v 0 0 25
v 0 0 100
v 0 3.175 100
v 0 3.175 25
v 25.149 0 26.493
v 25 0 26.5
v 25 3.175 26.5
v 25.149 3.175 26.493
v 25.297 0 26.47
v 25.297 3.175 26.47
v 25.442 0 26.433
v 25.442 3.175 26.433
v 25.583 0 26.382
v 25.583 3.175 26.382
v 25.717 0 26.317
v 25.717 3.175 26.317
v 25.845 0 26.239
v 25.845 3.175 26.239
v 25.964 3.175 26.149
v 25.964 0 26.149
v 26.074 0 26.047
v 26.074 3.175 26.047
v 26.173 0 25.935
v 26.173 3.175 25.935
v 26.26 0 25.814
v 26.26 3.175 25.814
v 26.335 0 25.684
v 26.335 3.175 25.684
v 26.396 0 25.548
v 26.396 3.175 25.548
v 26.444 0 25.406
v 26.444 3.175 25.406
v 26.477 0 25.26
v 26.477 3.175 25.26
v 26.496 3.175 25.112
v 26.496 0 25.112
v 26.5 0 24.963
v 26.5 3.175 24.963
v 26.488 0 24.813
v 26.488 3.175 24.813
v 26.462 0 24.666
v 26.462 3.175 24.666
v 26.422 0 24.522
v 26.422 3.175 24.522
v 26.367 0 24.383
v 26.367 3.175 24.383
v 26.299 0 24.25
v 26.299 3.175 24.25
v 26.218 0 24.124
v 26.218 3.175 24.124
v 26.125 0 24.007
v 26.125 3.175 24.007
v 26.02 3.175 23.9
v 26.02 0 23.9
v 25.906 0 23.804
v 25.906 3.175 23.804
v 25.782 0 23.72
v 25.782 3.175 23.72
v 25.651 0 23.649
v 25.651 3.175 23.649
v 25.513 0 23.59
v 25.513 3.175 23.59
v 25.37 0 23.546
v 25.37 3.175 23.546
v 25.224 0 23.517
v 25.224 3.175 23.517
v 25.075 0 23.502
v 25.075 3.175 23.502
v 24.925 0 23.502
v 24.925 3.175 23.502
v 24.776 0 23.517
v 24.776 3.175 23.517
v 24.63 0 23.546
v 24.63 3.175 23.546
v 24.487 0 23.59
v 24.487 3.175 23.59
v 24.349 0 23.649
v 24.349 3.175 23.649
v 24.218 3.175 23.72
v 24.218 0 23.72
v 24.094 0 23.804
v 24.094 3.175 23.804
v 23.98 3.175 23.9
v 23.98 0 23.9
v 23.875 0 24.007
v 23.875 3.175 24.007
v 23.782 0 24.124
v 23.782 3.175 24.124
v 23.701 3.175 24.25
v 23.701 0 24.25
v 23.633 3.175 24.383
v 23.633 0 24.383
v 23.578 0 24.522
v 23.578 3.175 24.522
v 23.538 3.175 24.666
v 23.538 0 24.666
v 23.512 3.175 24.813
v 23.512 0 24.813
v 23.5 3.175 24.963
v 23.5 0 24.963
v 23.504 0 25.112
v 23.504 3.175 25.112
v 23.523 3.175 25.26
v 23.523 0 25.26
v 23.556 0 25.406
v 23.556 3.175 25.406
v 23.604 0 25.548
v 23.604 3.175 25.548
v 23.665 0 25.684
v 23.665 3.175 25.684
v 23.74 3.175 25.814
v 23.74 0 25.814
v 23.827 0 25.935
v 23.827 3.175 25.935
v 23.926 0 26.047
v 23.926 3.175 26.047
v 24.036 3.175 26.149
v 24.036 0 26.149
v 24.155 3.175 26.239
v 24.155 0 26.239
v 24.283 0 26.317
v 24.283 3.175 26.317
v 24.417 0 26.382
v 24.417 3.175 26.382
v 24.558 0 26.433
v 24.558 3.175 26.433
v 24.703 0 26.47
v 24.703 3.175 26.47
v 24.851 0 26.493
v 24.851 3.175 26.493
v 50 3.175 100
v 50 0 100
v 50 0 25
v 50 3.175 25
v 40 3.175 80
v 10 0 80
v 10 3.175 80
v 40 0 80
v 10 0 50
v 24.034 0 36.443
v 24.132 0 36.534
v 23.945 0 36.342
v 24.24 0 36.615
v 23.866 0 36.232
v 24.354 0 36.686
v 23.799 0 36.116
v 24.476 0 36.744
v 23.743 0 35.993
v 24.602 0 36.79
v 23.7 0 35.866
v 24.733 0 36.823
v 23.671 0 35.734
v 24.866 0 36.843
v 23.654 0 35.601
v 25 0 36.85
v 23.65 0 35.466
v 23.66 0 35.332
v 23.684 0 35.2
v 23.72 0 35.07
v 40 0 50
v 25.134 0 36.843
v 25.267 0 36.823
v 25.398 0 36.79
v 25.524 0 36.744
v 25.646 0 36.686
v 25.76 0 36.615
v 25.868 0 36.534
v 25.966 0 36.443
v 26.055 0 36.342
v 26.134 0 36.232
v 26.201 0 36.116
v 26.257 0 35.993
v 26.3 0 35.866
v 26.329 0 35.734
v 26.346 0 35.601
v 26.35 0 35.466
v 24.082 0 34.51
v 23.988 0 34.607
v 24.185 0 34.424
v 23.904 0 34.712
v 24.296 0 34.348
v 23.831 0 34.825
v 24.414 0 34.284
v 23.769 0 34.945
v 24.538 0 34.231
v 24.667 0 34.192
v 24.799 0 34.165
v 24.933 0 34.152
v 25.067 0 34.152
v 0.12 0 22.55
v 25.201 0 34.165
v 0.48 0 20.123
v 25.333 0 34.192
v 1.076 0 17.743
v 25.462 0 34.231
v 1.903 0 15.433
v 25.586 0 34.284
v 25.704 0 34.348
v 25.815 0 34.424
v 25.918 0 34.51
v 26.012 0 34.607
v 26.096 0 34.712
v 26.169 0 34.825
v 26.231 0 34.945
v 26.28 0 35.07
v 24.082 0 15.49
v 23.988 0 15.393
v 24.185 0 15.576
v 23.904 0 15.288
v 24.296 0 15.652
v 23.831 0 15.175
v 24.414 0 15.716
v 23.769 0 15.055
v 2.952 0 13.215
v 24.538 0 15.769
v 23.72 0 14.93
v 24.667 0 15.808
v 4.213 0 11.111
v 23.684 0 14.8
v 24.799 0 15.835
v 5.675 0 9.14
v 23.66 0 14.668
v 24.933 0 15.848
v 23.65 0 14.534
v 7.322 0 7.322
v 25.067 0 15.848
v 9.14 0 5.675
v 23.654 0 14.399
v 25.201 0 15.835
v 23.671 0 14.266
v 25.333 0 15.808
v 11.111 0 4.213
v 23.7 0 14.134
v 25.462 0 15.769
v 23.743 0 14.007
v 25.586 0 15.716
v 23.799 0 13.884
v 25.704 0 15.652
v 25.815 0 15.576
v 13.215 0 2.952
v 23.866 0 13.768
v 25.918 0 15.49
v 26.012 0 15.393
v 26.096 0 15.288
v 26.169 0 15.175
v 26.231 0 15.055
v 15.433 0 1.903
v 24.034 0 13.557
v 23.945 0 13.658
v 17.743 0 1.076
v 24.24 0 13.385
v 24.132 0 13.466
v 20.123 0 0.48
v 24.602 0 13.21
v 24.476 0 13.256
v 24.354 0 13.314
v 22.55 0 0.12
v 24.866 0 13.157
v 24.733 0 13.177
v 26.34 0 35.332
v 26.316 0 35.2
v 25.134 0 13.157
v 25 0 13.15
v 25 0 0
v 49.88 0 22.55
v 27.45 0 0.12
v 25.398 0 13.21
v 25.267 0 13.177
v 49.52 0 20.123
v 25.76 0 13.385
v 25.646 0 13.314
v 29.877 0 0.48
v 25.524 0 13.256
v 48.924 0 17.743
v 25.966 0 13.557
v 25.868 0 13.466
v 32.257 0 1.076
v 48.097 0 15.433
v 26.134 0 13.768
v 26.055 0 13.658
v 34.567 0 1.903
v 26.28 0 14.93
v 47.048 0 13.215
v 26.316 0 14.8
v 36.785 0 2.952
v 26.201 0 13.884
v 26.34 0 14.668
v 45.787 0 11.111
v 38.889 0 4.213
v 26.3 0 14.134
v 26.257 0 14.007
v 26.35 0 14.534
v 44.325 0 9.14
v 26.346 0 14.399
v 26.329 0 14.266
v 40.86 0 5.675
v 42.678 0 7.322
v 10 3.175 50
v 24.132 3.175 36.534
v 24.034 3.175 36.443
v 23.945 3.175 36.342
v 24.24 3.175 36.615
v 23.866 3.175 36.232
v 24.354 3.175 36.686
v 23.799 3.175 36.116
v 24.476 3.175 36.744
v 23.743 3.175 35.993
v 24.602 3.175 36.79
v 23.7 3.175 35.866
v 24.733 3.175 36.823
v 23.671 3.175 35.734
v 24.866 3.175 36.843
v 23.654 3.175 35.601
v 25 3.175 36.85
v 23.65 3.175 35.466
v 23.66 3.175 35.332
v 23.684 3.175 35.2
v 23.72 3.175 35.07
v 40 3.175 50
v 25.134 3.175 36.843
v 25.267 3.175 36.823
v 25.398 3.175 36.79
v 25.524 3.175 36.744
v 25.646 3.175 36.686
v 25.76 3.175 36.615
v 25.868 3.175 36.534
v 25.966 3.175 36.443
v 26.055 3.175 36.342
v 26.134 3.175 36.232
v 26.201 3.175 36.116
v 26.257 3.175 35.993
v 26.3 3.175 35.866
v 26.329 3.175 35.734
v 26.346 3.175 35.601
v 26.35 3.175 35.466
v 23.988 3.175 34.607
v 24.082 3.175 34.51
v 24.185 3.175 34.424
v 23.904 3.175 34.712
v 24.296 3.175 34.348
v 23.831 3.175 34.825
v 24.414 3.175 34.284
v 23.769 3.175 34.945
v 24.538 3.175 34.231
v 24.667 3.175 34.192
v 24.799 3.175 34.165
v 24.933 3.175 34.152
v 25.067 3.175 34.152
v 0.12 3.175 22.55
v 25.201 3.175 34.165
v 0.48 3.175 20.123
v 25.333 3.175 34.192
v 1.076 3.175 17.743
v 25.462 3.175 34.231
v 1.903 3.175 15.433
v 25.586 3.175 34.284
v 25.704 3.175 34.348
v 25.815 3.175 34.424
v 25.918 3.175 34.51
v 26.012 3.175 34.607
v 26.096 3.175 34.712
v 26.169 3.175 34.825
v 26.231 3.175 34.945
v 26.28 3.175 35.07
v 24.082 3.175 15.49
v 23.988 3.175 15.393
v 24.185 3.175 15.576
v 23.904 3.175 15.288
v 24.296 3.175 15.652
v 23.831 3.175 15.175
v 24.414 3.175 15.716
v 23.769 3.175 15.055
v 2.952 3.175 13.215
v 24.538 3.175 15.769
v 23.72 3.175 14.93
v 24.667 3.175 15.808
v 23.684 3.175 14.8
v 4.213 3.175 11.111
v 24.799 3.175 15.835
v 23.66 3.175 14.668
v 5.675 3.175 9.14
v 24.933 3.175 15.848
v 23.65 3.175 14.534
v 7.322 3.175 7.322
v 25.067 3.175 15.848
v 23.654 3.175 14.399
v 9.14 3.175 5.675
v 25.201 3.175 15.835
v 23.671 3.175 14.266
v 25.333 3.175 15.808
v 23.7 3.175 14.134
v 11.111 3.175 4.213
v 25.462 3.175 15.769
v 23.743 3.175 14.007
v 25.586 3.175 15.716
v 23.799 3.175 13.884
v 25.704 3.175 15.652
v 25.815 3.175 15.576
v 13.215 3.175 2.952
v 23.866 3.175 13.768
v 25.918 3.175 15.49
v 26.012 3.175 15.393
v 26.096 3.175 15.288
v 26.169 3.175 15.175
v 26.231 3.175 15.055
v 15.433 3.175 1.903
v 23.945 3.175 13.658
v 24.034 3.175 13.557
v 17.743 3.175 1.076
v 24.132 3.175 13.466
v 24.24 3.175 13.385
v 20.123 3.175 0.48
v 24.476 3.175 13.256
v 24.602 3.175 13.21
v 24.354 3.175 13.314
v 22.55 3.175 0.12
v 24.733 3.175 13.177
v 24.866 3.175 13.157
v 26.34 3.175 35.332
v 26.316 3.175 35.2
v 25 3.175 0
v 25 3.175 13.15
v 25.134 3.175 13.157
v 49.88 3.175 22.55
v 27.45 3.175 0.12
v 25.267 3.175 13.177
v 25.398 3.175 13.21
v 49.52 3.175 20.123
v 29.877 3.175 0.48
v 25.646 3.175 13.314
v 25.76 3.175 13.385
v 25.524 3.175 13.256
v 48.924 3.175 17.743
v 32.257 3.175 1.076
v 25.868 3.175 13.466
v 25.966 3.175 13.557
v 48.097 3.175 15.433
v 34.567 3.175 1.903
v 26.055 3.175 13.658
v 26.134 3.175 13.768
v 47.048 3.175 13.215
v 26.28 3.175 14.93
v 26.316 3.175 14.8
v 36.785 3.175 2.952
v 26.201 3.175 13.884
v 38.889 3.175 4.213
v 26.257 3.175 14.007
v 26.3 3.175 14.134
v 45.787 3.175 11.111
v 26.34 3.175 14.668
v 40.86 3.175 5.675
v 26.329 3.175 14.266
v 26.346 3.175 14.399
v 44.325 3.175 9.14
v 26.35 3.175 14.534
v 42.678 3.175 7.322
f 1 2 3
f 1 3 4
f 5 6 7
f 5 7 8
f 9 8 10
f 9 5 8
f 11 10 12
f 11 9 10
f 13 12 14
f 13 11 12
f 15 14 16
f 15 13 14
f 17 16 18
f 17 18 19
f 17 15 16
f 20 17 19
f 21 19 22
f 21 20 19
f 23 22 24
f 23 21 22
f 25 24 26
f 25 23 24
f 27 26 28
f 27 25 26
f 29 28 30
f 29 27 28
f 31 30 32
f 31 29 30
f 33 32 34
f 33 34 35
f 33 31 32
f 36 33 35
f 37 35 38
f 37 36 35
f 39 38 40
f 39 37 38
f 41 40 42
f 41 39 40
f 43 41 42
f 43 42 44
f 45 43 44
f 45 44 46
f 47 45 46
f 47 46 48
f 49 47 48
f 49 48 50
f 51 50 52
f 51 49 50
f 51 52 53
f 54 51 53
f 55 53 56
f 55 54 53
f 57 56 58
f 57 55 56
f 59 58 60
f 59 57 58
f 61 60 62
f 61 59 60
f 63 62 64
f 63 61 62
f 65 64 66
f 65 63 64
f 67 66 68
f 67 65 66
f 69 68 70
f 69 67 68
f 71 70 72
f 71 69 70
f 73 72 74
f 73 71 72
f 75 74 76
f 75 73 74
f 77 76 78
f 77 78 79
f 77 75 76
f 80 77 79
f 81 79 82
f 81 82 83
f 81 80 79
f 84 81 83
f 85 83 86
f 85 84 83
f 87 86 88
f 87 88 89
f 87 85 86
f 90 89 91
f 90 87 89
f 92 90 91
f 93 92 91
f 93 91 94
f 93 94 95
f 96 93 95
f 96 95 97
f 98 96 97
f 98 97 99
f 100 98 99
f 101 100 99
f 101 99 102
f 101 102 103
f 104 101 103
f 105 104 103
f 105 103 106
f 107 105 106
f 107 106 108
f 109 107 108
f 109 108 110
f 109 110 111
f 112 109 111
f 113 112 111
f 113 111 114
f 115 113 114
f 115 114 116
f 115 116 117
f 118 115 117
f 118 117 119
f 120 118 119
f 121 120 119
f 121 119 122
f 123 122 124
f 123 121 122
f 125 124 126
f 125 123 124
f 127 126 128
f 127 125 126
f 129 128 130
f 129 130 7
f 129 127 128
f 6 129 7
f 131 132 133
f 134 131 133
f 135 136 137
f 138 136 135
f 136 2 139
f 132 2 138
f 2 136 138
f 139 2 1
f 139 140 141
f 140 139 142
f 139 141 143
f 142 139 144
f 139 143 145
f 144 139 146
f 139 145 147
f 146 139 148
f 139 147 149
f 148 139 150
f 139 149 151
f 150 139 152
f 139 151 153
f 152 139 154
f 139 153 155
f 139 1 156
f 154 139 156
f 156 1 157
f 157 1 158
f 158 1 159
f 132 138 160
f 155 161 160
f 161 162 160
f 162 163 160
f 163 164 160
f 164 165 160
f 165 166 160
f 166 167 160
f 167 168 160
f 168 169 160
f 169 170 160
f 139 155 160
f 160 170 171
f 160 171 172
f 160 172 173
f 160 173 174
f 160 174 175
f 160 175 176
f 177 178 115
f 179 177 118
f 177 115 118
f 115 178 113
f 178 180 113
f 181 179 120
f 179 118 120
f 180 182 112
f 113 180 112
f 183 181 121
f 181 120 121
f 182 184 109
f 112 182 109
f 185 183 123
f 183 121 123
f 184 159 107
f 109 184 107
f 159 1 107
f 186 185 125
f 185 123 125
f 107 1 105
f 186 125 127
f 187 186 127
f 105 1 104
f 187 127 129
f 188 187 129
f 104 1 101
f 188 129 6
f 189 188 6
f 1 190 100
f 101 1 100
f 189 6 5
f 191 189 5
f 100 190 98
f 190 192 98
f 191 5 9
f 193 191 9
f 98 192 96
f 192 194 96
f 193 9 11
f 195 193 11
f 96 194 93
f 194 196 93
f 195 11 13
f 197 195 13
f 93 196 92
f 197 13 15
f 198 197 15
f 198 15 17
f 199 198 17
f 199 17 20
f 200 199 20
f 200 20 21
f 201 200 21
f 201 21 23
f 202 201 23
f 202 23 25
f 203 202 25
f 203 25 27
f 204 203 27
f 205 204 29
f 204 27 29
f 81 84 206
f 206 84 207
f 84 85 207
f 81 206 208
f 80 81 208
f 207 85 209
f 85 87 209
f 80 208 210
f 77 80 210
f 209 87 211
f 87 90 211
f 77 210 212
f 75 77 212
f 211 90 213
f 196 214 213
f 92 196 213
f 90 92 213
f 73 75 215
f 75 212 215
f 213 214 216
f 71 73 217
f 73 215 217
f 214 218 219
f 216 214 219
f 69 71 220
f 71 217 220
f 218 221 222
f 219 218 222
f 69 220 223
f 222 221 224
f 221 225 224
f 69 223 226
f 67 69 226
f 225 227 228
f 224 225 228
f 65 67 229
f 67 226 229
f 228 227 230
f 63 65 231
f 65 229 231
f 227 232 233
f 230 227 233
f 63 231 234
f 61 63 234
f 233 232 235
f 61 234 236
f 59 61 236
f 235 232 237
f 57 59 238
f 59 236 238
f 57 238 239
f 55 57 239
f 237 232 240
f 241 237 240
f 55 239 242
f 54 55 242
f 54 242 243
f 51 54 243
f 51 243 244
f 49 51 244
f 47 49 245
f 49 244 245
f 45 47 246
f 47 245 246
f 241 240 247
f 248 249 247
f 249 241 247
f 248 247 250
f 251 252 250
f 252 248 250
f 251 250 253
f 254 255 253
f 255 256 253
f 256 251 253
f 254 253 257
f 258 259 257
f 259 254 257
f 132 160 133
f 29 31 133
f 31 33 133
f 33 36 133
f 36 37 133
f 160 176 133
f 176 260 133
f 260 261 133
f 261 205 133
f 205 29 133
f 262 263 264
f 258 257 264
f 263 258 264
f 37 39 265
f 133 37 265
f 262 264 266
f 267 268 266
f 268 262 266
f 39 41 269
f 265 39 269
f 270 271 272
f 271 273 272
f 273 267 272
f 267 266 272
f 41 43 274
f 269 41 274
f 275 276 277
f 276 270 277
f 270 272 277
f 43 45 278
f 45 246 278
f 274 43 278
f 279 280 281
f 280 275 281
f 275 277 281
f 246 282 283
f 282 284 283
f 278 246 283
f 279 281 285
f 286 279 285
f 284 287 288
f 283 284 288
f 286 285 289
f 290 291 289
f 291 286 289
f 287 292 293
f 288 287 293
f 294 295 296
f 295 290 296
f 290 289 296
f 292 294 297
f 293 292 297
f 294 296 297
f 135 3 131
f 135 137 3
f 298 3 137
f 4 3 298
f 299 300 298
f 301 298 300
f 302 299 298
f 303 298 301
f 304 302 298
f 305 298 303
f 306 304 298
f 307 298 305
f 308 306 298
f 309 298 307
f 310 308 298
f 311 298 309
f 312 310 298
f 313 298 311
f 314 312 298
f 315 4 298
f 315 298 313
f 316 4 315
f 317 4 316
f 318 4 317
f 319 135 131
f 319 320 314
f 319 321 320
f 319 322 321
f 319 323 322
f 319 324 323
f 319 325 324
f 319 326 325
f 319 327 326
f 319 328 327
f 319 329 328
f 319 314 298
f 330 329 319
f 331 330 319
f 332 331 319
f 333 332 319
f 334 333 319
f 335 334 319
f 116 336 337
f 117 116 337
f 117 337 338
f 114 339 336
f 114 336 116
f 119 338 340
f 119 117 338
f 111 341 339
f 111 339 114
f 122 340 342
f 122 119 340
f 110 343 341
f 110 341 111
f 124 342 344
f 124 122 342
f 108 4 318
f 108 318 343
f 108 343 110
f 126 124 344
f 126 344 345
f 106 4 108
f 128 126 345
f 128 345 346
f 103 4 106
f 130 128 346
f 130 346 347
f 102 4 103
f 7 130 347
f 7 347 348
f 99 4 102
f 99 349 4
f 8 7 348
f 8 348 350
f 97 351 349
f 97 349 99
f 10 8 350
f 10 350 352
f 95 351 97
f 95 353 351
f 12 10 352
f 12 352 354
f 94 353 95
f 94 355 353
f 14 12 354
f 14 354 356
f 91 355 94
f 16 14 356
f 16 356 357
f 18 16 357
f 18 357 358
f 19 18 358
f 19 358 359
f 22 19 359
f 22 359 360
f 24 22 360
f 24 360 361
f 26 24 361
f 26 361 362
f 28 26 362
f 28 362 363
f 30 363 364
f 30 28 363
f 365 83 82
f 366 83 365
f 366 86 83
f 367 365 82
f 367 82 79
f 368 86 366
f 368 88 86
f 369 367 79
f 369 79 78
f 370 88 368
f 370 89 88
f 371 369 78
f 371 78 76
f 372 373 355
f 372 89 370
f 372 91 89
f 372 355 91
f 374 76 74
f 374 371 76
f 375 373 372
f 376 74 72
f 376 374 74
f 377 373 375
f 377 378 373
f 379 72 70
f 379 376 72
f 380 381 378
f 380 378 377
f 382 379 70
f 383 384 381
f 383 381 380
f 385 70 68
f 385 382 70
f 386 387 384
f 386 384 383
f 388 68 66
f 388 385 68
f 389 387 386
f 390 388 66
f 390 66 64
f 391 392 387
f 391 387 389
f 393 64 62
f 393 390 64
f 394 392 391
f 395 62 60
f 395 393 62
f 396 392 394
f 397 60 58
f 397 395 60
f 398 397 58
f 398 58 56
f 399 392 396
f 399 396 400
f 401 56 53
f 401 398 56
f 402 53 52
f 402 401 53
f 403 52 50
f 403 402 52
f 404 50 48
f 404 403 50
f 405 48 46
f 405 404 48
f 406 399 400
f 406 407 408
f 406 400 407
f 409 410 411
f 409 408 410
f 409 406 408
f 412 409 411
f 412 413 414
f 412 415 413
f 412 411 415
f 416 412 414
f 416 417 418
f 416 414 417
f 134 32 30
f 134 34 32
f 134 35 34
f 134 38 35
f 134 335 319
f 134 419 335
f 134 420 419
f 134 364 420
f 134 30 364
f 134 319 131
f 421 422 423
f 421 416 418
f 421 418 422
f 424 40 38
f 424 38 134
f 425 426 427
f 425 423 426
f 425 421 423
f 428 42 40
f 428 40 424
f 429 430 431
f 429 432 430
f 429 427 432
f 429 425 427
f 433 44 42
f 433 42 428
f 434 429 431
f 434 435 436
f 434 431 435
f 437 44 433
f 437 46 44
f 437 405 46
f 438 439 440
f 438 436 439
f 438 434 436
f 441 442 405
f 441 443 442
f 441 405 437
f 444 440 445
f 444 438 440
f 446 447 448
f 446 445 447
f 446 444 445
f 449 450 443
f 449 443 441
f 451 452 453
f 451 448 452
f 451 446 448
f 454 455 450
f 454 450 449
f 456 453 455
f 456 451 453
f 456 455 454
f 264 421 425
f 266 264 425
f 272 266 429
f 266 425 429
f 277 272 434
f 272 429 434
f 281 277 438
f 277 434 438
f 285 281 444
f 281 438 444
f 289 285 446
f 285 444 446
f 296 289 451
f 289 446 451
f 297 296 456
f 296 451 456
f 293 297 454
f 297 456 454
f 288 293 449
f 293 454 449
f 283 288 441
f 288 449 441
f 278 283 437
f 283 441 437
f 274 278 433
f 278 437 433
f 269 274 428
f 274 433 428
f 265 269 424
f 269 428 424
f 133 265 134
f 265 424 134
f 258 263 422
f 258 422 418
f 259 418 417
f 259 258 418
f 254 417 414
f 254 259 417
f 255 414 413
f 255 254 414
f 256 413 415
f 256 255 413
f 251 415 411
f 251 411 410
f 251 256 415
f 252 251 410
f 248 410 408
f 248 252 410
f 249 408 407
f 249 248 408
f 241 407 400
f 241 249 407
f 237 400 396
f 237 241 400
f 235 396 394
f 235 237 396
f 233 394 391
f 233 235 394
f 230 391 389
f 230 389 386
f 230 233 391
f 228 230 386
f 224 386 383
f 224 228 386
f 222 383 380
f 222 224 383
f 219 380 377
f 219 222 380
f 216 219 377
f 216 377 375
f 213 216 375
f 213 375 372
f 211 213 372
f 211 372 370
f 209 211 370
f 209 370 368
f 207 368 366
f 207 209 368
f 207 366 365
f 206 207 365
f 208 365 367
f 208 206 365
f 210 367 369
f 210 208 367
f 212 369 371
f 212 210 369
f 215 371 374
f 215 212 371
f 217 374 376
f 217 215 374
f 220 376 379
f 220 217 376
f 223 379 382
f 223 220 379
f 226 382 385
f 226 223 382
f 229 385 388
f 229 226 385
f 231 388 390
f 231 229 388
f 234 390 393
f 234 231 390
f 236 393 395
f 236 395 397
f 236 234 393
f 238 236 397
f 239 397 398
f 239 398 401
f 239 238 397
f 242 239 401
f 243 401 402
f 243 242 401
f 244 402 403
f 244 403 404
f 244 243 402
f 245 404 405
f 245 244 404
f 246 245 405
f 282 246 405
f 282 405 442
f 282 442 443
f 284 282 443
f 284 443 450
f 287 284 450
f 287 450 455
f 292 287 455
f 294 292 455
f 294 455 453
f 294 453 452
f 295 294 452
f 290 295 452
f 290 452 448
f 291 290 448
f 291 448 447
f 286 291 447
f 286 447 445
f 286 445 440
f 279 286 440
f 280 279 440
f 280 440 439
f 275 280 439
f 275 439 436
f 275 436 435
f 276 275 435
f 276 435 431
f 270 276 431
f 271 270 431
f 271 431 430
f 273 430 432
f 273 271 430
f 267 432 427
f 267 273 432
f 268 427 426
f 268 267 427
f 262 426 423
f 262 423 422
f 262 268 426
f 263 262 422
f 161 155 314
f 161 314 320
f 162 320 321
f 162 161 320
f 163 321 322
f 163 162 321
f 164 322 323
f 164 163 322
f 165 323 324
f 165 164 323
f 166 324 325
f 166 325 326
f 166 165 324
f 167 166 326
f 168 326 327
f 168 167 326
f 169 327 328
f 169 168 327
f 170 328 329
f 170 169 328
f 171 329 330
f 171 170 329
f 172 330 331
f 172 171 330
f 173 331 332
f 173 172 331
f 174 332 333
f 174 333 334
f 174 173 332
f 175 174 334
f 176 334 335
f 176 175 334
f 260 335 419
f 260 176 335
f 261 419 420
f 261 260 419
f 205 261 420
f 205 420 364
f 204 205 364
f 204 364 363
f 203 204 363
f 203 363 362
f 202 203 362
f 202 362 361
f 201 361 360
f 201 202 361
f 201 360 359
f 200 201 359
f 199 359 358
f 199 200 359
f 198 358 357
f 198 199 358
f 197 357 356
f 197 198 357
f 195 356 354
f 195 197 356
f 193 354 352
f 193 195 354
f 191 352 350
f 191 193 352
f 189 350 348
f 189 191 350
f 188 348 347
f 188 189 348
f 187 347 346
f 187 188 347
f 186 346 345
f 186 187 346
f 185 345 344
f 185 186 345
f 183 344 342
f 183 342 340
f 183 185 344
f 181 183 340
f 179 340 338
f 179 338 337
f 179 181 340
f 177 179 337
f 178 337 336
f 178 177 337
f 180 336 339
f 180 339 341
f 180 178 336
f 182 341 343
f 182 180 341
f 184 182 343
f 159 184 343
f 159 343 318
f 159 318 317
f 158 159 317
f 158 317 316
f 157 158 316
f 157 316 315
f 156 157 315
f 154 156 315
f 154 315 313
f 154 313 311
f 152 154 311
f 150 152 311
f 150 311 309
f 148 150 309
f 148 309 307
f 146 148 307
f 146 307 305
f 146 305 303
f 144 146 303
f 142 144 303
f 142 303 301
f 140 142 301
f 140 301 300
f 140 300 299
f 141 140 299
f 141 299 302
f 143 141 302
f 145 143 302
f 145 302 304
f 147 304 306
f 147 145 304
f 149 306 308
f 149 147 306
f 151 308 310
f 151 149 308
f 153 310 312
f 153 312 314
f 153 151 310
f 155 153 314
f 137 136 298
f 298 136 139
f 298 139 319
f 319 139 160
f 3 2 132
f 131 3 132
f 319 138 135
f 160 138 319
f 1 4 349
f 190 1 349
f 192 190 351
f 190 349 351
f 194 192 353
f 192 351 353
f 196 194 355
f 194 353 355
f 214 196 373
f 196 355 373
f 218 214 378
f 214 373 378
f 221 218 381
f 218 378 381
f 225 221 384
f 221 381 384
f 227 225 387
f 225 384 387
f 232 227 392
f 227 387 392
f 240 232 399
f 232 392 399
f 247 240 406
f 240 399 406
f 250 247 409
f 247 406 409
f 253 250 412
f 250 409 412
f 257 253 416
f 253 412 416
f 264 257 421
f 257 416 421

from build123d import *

# Parameters (mm, degrees)
SKETCH1_W           = 50
SKETCH1_H           = 100
SKETCH1_R           = 1.5
SKETCH1_R_2         = 1.35
SKETCH1_W_2         = 30
SKETCH1_H_2         = 30
BOSS_EXTRUDE1_DEPTH = 3.175
CUT_EXTRUDE1_DEPTH  = 6.35


with BuildPart() as part:
    # Sketch1 → Boss-Extrude1 (new body)
    with BuildSketch(Plane(origin=(0, 0, 0), x_dir=(1, 0, 0), z_dir=(0, 1, 0))):
        with Locations((25, -50)):
            Rectangle(SKETCH1_W, SKETCH1_H)
        with Locations(Location((25, -25, 0), (0, 0, 270))):
            Circle(SKETCH1_R, mode=Mode.SUBTRACT)
        with Locations(Location((25, -14.5, 0), (0, 0, 90))):
            Circle(SKETCH1_R_2, mode=Mode.SUBTRACT)
        with Locations(Location((25, -35.5, 0), (0, 0, 270))):
            Circle(SKETCH1_R_2, mode=Mode.SUBTRACT)
        with Locations((25, -65)):
            Rectangle(SKETCH1_W_2, SKETCH1_H_2, mode=Mode.SUBTRACT)
    extrude(amount=BOSS_EXTRUDE1_DEPTH)

    # Sketch2 → Cut-Extrude1 (cut)
    with BuildSketch(Plane(origin=(0, 3.175, 0), x_dir=(1, 0, 0), z_dir=(0, 1, 0))):
        with BuildLine():
            Line((0, 0), (0, -25))
            ThreePointArc((0, -25), (7.32233047, -7.32233047), (25, 0))
            Line((25, 0), (0, 0))
        make_face()
        with BuildLine():
            ThreePointArc((25, 0), (42.67766953, -7.32233047), (50, -25))
            Line((50, -25), (50, 0))
            Line((50, 0), (25, 0))
        make_face()
    extrude(amount=-CUT_EXTRUDE1_DEPTH, mode=Mode.SUBTRACT)


solid = part.part
